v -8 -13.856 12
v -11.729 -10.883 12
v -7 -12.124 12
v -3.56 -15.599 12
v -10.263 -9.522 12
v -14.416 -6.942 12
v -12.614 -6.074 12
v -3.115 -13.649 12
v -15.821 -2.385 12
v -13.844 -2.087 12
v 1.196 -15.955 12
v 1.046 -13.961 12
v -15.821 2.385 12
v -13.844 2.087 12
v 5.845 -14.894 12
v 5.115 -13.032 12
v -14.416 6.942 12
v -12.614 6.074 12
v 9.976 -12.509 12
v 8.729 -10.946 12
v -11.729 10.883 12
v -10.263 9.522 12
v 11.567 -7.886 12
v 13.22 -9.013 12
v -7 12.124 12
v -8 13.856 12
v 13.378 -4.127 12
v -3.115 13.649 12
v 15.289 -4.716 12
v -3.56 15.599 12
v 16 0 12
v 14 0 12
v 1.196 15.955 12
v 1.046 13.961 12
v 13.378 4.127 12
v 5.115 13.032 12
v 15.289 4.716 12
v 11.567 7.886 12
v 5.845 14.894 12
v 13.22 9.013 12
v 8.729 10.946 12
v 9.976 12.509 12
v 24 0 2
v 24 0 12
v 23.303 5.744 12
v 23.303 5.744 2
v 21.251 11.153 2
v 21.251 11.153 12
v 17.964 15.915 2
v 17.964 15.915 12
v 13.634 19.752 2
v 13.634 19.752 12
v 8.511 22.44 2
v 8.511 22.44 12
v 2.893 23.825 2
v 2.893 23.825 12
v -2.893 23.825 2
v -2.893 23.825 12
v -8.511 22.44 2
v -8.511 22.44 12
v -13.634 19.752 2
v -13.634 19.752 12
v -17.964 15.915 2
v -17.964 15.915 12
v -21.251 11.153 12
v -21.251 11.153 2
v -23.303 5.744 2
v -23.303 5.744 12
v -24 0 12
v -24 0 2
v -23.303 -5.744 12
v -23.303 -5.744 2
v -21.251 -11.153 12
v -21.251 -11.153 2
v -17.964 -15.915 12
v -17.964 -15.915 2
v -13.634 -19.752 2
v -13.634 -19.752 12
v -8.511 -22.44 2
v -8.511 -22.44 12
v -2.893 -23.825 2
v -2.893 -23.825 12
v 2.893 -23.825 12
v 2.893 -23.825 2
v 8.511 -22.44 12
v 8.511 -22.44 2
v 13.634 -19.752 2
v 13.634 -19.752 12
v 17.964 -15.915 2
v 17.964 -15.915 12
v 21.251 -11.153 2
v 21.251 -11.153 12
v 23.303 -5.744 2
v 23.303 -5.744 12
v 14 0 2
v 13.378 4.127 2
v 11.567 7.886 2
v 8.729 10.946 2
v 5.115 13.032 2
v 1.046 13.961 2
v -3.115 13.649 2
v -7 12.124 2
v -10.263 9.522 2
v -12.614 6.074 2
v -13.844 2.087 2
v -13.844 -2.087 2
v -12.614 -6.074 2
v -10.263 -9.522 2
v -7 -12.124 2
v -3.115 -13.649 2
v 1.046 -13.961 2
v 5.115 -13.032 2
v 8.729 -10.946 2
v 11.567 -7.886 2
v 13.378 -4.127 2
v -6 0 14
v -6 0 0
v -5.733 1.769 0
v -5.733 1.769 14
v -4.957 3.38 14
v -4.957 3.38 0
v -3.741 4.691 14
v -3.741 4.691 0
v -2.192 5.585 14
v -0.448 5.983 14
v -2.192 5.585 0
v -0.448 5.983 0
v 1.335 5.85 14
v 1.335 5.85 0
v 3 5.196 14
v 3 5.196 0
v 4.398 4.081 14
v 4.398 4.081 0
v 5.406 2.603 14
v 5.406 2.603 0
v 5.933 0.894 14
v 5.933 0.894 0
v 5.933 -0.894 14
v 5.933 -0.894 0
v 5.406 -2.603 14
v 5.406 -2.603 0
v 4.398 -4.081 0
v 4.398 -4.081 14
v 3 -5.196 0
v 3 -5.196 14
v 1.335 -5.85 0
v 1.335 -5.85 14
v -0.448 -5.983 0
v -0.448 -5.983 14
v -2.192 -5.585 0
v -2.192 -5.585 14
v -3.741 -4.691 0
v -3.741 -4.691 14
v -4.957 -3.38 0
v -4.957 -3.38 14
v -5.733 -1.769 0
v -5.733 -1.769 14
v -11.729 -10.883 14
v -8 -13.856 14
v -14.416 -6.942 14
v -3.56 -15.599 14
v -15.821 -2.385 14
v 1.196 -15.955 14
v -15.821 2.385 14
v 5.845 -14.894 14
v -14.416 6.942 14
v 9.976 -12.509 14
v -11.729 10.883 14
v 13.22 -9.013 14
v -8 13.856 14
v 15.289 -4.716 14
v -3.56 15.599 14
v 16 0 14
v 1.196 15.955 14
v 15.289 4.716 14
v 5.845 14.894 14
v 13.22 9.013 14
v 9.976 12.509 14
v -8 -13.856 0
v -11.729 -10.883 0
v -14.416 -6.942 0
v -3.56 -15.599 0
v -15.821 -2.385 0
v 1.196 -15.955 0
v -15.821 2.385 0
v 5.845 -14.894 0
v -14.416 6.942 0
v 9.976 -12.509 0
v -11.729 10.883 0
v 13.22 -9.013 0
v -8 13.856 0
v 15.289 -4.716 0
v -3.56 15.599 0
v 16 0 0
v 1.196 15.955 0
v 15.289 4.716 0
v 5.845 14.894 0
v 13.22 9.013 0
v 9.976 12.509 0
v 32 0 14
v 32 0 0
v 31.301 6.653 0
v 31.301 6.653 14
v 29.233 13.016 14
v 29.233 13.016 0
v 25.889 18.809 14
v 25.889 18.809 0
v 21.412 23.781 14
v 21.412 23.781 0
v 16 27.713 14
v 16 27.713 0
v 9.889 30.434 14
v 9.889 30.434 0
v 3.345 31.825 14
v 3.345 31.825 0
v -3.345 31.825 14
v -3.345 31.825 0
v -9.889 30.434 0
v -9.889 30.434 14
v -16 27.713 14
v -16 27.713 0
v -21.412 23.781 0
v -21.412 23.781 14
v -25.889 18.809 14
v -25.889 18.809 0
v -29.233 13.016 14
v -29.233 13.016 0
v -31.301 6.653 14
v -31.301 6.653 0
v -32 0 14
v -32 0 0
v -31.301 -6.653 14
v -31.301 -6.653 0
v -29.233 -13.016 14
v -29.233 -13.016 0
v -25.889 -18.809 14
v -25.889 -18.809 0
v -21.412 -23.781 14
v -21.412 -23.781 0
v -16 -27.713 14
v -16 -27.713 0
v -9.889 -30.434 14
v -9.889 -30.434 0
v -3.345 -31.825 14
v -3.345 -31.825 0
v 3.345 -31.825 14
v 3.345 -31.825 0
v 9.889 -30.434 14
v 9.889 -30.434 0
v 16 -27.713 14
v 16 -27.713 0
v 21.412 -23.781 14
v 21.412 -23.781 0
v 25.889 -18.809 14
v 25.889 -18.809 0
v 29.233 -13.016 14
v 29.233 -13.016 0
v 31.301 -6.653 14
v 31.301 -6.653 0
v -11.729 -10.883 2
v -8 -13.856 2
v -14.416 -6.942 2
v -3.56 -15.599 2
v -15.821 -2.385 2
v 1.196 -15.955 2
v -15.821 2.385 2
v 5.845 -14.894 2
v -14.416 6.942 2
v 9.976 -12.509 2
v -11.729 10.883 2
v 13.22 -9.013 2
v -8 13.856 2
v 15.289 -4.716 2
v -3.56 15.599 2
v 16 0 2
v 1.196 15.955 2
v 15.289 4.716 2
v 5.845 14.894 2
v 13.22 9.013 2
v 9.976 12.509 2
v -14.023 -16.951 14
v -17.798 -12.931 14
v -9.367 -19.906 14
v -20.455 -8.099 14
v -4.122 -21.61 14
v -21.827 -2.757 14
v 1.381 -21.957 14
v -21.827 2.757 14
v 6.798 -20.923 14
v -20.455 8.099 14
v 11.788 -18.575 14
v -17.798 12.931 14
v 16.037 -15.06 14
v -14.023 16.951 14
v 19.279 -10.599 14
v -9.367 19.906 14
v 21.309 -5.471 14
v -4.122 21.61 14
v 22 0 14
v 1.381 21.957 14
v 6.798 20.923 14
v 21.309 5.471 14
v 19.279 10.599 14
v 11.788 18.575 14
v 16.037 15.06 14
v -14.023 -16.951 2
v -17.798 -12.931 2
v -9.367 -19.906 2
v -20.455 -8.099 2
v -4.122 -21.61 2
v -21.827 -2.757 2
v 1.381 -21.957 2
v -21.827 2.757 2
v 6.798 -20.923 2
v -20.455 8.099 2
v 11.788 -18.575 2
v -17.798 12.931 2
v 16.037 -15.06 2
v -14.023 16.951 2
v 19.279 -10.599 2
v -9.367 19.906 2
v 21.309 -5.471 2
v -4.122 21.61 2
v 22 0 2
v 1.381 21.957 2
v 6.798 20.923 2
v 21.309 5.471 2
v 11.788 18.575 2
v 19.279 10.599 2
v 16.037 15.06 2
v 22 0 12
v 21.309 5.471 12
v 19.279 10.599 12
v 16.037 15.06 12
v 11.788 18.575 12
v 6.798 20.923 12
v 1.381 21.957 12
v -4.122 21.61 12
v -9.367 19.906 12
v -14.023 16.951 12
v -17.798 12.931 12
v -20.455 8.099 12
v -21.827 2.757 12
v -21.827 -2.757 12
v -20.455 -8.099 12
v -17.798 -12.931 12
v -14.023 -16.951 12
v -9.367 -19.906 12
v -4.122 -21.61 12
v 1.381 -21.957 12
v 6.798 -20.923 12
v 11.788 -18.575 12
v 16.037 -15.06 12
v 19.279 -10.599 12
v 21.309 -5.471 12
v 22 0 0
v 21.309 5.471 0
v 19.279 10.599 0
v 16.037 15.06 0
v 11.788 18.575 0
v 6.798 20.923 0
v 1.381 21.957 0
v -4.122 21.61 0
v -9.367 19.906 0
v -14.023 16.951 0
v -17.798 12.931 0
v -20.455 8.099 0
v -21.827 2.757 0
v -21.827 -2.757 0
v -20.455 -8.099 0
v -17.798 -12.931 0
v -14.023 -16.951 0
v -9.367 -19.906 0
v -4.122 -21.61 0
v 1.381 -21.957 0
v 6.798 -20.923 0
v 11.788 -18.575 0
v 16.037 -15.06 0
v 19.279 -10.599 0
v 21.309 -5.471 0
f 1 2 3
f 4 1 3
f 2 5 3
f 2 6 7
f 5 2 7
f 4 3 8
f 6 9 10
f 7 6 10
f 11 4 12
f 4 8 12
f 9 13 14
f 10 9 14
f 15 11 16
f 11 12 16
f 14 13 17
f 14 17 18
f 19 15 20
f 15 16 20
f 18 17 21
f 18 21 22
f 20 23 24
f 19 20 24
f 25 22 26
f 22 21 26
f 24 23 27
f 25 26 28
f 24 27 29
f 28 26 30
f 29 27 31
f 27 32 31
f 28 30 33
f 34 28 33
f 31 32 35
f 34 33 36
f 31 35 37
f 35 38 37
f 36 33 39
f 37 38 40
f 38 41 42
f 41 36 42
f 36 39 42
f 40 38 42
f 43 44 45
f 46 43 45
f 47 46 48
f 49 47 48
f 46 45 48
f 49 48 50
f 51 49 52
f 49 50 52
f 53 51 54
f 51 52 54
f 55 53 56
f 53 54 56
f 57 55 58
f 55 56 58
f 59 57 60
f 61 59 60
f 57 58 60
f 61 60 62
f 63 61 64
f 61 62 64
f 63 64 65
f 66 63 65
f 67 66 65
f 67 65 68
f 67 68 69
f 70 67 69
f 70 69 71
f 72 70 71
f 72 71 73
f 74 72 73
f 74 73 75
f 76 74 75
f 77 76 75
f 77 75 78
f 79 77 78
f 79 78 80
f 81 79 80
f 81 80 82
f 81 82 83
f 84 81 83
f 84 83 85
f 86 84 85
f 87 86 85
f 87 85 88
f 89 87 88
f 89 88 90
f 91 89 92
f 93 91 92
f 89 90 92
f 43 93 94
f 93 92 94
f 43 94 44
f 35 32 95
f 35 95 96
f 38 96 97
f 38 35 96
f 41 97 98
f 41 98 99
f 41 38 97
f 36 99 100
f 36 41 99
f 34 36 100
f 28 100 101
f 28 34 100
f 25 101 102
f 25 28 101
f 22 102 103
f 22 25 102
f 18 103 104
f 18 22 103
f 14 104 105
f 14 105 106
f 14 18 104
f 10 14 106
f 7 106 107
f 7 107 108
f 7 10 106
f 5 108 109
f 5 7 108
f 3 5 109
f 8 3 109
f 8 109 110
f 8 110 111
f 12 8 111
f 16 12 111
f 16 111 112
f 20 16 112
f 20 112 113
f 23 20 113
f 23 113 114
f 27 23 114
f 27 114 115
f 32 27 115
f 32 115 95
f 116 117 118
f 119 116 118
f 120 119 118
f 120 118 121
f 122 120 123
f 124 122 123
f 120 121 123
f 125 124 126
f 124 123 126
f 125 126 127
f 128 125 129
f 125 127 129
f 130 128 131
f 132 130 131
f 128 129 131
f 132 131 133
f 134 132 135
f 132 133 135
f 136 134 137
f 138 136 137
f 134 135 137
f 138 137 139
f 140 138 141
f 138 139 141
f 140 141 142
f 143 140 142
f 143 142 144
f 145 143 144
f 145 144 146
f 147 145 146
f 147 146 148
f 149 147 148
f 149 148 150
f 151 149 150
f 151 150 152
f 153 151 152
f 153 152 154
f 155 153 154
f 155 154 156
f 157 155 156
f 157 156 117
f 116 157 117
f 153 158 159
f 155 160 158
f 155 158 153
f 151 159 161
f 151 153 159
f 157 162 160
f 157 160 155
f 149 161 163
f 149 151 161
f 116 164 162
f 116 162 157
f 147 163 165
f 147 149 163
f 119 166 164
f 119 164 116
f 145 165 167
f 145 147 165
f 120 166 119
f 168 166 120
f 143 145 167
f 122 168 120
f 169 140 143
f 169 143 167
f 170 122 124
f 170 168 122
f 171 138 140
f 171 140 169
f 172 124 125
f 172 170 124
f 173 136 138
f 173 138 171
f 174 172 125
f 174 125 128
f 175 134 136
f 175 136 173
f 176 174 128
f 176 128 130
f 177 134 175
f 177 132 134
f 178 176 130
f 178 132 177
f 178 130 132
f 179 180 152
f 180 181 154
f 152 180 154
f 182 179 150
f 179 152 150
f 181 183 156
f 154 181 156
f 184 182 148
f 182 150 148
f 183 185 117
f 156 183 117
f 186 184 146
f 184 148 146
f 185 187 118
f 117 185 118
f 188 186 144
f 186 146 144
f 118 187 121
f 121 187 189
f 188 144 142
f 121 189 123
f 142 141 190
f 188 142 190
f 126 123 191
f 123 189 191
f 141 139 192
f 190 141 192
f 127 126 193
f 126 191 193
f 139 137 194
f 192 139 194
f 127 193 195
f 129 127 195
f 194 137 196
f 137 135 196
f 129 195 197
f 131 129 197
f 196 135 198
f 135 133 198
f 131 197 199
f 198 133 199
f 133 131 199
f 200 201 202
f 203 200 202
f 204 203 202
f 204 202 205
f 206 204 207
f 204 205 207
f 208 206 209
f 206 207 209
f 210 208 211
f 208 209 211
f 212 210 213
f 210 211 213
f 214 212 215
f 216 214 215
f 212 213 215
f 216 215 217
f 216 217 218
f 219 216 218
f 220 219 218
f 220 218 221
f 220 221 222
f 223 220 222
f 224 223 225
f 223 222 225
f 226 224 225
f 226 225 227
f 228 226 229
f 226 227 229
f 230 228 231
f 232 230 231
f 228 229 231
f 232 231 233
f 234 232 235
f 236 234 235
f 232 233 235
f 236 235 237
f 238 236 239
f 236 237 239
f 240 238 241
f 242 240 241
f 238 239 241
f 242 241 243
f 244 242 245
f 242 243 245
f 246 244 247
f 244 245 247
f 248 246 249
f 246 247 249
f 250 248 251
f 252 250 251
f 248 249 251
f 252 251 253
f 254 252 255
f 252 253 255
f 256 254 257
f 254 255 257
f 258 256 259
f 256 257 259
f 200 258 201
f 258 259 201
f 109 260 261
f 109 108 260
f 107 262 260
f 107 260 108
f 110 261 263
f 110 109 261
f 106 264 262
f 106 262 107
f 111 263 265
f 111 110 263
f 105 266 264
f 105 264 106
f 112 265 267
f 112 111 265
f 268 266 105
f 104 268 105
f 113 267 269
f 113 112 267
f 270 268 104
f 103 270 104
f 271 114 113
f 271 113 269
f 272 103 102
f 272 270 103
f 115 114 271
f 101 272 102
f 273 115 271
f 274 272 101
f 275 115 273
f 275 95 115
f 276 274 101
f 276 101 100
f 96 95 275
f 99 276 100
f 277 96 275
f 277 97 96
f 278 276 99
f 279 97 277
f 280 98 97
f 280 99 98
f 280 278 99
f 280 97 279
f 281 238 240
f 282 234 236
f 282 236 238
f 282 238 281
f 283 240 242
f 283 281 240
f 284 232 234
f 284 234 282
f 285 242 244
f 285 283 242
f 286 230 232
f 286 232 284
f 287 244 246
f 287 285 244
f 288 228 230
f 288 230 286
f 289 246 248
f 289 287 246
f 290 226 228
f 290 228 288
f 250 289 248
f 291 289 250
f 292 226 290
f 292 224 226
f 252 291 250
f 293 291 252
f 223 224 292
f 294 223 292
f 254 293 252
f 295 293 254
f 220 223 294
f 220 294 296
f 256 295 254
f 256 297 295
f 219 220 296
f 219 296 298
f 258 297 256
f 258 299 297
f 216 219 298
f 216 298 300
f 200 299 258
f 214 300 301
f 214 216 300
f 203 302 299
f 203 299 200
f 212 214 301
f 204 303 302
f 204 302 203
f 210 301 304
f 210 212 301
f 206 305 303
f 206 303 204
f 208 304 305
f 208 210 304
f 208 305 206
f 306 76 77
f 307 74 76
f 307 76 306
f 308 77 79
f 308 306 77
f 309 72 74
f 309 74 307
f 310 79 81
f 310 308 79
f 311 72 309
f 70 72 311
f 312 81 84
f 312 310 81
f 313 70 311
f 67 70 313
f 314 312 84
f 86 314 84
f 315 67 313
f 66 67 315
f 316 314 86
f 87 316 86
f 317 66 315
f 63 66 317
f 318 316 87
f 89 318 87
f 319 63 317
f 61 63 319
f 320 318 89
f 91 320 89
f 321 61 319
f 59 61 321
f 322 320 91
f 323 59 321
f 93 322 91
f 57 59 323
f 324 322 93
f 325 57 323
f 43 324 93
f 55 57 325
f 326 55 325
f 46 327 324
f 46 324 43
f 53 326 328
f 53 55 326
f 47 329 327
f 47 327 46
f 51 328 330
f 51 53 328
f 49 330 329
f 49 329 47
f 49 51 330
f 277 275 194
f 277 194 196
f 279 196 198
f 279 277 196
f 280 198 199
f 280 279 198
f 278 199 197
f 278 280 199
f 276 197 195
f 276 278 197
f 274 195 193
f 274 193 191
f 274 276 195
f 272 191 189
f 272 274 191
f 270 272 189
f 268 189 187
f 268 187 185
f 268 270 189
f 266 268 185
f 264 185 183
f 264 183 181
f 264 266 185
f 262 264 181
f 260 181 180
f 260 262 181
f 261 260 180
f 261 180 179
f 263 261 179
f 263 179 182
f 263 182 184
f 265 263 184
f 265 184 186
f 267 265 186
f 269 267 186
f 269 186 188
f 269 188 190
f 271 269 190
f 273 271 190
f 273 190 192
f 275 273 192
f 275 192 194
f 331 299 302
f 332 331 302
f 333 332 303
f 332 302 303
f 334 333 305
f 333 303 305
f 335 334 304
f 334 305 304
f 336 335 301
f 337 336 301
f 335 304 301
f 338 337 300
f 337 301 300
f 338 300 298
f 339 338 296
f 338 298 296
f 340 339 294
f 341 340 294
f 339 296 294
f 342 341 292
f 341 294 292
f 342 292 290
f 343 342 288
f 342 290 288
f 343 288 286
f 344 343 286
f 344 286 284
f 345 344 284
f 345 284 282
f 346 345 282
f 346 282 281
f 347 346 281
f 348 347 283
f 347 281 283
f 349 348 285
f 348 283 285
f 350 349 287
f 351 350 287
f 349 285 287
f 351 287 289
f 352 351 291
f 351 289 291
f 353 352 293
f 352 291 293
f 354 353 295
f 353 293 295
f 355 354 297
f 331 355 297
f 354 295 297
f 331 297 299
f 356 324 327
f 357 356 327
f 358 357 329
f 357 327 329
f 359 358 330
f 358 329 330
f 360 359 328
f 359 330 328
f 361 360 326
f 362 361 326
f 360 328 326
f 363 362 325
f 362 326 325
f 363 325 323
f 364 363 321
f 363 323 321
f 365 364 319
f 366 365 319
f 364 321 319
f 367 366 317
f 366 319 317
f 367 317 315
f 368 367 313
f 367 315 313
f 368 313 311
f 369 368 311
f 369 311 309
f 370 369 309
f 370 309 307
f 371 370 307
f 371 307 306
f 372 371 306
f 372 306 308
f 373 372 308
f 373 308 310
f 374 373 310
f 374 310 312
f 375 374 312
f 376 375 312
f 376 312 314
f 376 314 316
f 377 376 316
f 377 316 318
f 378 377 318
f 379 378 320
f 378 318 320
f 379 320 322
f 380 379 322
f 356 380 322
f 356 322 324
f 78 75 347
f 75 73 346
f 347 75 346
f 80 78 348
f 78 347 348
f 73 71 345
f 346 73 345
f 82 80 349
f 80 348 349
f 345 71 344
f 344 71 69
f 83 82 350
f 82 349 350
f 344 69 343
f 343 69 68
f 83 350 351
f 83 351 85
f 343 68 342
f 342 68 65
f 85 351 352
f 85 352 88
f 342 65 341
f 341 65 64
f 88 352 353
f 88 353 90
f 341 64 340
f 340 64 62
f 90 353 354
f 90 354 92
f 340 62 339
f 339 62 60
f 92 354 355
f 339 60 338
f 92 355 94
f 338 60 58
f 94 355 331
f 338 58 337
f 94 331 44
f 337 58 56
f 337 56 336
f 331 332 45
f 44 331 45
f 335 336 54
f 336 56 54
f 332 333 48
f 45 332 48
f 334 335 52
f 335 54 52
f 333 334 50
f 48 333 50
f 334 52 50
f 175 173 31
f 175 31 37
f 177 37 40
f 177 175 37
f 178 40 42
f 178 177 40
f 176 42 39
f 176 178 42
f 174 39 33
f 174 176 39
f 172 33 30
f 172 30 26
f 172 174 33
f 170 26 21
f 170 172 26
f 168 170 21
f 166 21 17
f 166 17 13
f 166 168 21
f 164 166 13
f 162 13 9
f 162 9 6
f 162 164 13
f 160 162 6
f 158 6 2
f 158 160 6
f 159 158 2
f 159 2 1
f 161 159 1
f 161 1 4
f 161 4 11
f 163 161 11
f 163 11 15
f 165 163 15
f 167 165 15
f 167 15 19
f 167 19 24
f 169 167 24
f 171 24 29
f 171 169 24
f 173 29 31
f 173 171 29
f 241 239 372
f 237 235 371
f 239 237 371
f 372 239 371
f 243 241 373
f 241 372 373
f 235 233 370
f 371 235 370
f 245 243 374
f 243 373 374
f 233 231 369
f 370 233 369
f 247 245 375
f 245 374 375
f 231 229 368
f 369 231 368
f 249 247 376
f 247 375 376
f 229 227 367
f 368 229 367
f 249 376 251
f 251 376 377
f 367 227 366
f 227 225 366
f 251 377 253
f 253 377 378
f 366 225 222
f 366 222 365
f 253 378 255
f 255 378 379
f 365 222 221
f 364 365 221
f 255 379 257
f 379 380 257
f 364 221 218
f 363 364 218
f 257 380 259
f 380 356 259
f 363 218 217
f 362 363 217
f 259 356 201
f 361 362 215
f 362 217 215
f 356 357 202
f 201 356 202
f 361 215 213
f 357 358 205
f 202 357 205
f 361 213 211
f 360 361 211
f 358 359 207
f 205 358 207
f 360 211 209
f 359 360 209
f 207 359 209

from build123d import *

# Parameters (mm, degrees)
SKETCH1_R           = 32
BOSS_EXTRUDE1_DEPTH = 14
SKETCH2_R           = 24
SKETCH2_R_2         = 14
CUT_EXTRUDE1_DEPTH  = 12
SKETCH3_R           = 16
SKETCH3_R_2         = 14
BOSS_EXTRUDE2_DEPTH = 2
SKETCH4_R           = 24
SKETCH4_R_2         = 22
BOSS_EXTRUDE3_DEPTH = 2
SKETCH5_R           = 22
SKETCH5_R_2         = 16
CUT_EXTRUDE2_DEPTH  = 68
SKETCH6_R           = 6
CUT_EXTRUDE3_DEPTH  = 68


with BuildPart() as part:
    # Sketch1 → Boss-Extrude1 (new body)
    with BuildSketch(Plane.XY):
        Circle(SKETCH1_R)
    extrude(amount=BOSS_EXTRUDE1_DEPTH)

    # Sketch2 → Cut-Extrude1 (cut)
    with BuildSketch(Plane.XY.offset(14)):
        Circle(SKETCH2_R)
        Circle(SKETCH2_R_2, mode=Mode.SUBTRACT)
    extrude(amount=-CUT_EXTRUDE1_DEPTH, mode=Mode.SUBTRACT)

    # Sketch3 → Boss-Extrude2 (add)
    with BuildSketch(Plane.XY.offset(14)):
        Circle(SKETCH3_R)
        Circle(SKETCH3_R_2, mode=Mode.SUBTRACT)
    extrude(amount=-BOSS_EXTRUDE2_DEPTH)

    # Sketch4 → Boss-Extrude3 (add)
    with BuildSketch(Plane.XY.offset(14)):
        Circle(SKETCH4_R)
        Circle(SKETCH4_R_2, mode=Mode.SUBTRACT)
    extrude(amount=-BOSS_EXTRUDE3_DEPTH)

    # Sketch5 → Cut-Extrude2 (cut)
    with BuildSketch(Plane.XY.offset(14)):
        Circle(SKETCH5_R)
        Circle(SKETCH5_R_2, mode=Mode.SUBTRACT)
    extrude(amount=-CUT_EXTRUDE2_DEPTH, mode=Mode.SUBTRACT)


with BuildPart() as cut_extrude2_piece_1:
    # of the separate pieces the step leaves, piece 1, a body of its own (cut_extrude2_pieces)
    add(part.part.solids().sort_by_distance((32, 0, 0))[0])


with BuildPart() as cut_extrude2_piece_2:
    # of the separate pieces the step leaves, piece 2, a body of its own (cut_extrude2_pieces)
    add(part.part.solids().sort_by_distance((16, 0, 0))[0])

    # Sketch6 → Cut-Extrude3 (cut)
    with BuildSketch(Plane(origin=(0, 0, 0), x_dir=(-1, 0, 0), z_dir=(0, 0, -1))):
        Circle(SKETCH6_R)
    extrude(amount=-CUT_EXTRUDE3_DEPTH, mode=Mode.SUBTRACT)


solid = Compound([cut_extrude2_piece_1.part, cut_extrude2_piece_2.part])
